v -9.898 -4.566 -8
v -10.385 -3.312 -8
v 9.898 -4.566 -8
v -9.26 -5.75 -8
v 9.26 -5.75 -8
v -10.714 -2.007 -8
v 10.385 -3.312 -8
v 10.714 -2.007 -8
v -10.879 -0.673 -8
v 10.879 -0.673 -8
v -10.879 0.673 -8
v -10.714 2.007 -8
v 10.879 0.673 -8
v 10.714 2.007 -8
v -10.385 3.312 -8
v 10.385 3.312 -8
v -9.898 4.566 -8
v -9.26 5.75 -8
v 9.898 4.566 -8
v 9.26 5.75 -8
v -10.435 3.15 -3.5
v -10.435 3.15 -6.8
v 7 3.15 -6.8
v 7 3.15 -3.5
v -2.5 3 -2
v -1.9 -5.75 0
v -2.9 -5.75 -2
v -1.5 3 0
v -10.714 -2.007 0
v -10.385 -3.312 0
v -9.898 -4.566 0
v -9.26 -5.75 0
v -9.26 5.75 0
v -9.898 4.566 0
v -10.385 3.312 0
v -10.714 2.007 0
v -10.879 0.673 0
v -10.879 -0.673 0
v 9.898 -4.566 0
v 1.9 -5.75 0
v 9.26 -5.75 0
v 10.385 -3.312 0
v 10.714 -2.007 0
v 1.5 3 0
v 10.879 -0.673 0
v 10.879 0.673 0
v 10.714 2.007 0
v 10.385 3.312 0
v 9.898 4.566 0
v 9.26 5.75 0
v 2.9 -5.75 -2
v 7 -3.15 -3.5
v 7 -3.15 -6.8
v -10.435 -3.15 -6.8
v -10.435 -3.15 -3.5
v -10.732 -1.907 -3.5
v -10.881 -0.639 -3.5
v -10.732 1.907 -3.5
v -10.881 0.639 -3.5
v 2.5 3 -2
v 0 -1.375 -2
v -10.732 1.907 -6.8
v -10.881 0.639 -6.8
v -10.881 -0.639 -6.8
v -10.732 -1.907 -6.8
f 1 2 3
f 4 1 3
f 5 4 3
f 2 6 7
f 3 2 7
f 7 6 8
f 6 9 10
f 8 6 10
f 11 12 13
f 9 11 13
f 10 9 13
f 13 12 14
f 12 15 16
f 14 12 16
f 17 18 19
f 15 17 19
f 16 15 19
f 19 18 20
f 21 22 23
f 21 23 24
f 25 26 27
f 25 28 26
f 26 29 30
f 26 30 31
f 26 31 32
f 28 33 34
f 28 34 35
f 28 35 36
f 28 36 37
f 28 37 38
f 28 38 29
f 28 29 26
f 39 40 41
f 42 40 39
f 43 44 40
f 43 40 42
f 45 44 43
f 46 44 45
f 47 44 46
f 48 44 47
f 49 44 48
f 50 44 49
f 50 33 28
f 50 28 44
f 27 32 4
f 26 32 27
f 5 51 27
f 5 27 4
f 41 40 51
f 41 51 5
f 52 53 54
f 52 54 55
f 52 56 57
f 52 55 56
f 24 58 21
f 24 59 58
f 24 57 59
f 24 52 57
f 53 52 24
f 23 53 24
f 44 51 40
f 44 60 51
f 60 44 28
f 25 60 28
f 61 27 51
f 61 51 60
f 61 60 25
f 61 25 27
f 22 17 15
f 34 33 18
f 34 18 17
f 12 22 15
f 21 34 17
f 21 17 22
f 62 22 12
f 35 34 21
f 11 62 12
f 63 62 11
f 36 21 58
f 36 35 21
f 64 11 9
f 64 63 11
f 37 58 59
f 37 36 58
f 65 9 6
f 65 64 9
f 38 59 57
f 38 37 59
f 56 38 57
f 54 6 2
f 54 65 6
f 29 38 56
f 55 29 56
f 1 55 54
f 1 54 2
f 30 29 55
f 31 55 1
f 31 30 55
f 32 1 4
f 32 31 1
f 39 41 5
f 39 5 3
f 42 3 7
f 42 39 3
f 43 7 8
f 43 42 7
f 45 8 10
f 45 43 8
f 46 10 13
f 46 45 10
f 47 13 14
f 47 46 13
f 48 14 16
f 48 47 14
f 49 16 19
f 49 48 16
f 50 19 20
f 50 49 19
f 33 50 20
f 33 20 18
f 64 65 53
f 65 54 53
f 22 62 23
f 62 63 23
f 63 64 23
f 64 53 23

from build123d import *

# Parameters (mm, degrees)
F1_DEPTH = 8
F6_W     = 6.3
F6_H     = 3.3
F7_DEPTH = 11.9
F8_DEPTH = 7


with BuildPart() as f1:
    # F0 (on Top) → F1 (new body)
    with BuildSketch(Plane.XY):
        with BuildLine():
            Line((9.259995, 5.75), (8.785642, 5.75))
            Line((8.785642, 5.75), (-8.785642, 5.75))
            Line((-8.785642, 5.75), (-9.259995, 5.75))
            ThreePointArc((-9.259995, 5.75), (-10.9, 0), (-9.259995, -5.75))
            Line((-9.259995, -5.75), (-8.785642, -5.75))
            Line((-8.785642, -5.75), (8.785642, -5.75))
            Line((8.785642, -5.75), (9.259995, -5.75))
            ThreePointArc((9.259995, -5.75), (10.9, 0), (9.259995, 5.75))
        make_face()
    extrude(amount=-F1_DEPTH)

    # F2 (on face) → F5 section 0
    with BuildSketch(Plane.XZ.offset(5.75)):
        Polygon((1.9, 0), (-1.9, 0), (-2.9, -2), (2.9, -2), align=None)
    # F4 (on offset) → F5 section 1
    with BuildSketch(Plane.XZ.offset(-3)):
        Polygon((2.5, -2), (1.5, 0), (-1.5, 0), (-2.5, -2), align=None)
    loft(mode=Mode.SUBTRACT)

    # F6 (on Right) → F7 (cut)
    with BuildSketch(Plane.YZ):
        with Locations((0, -5.15)):
            Rectangle(F6_W, F6_H)
    extrude(amount=-F7_DEPTH, mode=Mode.SUBTRACT)

    # F6 (on Right) → F8 (cut)
    with BuildSketch(Plane.YZ):
        with Locations((0, -5.15)):
            Rectangle(F6_W, F6_H)
    extrude(amount=F8_DEPTH, mode=Mode.SUBTRACT)


solid = f1.part
